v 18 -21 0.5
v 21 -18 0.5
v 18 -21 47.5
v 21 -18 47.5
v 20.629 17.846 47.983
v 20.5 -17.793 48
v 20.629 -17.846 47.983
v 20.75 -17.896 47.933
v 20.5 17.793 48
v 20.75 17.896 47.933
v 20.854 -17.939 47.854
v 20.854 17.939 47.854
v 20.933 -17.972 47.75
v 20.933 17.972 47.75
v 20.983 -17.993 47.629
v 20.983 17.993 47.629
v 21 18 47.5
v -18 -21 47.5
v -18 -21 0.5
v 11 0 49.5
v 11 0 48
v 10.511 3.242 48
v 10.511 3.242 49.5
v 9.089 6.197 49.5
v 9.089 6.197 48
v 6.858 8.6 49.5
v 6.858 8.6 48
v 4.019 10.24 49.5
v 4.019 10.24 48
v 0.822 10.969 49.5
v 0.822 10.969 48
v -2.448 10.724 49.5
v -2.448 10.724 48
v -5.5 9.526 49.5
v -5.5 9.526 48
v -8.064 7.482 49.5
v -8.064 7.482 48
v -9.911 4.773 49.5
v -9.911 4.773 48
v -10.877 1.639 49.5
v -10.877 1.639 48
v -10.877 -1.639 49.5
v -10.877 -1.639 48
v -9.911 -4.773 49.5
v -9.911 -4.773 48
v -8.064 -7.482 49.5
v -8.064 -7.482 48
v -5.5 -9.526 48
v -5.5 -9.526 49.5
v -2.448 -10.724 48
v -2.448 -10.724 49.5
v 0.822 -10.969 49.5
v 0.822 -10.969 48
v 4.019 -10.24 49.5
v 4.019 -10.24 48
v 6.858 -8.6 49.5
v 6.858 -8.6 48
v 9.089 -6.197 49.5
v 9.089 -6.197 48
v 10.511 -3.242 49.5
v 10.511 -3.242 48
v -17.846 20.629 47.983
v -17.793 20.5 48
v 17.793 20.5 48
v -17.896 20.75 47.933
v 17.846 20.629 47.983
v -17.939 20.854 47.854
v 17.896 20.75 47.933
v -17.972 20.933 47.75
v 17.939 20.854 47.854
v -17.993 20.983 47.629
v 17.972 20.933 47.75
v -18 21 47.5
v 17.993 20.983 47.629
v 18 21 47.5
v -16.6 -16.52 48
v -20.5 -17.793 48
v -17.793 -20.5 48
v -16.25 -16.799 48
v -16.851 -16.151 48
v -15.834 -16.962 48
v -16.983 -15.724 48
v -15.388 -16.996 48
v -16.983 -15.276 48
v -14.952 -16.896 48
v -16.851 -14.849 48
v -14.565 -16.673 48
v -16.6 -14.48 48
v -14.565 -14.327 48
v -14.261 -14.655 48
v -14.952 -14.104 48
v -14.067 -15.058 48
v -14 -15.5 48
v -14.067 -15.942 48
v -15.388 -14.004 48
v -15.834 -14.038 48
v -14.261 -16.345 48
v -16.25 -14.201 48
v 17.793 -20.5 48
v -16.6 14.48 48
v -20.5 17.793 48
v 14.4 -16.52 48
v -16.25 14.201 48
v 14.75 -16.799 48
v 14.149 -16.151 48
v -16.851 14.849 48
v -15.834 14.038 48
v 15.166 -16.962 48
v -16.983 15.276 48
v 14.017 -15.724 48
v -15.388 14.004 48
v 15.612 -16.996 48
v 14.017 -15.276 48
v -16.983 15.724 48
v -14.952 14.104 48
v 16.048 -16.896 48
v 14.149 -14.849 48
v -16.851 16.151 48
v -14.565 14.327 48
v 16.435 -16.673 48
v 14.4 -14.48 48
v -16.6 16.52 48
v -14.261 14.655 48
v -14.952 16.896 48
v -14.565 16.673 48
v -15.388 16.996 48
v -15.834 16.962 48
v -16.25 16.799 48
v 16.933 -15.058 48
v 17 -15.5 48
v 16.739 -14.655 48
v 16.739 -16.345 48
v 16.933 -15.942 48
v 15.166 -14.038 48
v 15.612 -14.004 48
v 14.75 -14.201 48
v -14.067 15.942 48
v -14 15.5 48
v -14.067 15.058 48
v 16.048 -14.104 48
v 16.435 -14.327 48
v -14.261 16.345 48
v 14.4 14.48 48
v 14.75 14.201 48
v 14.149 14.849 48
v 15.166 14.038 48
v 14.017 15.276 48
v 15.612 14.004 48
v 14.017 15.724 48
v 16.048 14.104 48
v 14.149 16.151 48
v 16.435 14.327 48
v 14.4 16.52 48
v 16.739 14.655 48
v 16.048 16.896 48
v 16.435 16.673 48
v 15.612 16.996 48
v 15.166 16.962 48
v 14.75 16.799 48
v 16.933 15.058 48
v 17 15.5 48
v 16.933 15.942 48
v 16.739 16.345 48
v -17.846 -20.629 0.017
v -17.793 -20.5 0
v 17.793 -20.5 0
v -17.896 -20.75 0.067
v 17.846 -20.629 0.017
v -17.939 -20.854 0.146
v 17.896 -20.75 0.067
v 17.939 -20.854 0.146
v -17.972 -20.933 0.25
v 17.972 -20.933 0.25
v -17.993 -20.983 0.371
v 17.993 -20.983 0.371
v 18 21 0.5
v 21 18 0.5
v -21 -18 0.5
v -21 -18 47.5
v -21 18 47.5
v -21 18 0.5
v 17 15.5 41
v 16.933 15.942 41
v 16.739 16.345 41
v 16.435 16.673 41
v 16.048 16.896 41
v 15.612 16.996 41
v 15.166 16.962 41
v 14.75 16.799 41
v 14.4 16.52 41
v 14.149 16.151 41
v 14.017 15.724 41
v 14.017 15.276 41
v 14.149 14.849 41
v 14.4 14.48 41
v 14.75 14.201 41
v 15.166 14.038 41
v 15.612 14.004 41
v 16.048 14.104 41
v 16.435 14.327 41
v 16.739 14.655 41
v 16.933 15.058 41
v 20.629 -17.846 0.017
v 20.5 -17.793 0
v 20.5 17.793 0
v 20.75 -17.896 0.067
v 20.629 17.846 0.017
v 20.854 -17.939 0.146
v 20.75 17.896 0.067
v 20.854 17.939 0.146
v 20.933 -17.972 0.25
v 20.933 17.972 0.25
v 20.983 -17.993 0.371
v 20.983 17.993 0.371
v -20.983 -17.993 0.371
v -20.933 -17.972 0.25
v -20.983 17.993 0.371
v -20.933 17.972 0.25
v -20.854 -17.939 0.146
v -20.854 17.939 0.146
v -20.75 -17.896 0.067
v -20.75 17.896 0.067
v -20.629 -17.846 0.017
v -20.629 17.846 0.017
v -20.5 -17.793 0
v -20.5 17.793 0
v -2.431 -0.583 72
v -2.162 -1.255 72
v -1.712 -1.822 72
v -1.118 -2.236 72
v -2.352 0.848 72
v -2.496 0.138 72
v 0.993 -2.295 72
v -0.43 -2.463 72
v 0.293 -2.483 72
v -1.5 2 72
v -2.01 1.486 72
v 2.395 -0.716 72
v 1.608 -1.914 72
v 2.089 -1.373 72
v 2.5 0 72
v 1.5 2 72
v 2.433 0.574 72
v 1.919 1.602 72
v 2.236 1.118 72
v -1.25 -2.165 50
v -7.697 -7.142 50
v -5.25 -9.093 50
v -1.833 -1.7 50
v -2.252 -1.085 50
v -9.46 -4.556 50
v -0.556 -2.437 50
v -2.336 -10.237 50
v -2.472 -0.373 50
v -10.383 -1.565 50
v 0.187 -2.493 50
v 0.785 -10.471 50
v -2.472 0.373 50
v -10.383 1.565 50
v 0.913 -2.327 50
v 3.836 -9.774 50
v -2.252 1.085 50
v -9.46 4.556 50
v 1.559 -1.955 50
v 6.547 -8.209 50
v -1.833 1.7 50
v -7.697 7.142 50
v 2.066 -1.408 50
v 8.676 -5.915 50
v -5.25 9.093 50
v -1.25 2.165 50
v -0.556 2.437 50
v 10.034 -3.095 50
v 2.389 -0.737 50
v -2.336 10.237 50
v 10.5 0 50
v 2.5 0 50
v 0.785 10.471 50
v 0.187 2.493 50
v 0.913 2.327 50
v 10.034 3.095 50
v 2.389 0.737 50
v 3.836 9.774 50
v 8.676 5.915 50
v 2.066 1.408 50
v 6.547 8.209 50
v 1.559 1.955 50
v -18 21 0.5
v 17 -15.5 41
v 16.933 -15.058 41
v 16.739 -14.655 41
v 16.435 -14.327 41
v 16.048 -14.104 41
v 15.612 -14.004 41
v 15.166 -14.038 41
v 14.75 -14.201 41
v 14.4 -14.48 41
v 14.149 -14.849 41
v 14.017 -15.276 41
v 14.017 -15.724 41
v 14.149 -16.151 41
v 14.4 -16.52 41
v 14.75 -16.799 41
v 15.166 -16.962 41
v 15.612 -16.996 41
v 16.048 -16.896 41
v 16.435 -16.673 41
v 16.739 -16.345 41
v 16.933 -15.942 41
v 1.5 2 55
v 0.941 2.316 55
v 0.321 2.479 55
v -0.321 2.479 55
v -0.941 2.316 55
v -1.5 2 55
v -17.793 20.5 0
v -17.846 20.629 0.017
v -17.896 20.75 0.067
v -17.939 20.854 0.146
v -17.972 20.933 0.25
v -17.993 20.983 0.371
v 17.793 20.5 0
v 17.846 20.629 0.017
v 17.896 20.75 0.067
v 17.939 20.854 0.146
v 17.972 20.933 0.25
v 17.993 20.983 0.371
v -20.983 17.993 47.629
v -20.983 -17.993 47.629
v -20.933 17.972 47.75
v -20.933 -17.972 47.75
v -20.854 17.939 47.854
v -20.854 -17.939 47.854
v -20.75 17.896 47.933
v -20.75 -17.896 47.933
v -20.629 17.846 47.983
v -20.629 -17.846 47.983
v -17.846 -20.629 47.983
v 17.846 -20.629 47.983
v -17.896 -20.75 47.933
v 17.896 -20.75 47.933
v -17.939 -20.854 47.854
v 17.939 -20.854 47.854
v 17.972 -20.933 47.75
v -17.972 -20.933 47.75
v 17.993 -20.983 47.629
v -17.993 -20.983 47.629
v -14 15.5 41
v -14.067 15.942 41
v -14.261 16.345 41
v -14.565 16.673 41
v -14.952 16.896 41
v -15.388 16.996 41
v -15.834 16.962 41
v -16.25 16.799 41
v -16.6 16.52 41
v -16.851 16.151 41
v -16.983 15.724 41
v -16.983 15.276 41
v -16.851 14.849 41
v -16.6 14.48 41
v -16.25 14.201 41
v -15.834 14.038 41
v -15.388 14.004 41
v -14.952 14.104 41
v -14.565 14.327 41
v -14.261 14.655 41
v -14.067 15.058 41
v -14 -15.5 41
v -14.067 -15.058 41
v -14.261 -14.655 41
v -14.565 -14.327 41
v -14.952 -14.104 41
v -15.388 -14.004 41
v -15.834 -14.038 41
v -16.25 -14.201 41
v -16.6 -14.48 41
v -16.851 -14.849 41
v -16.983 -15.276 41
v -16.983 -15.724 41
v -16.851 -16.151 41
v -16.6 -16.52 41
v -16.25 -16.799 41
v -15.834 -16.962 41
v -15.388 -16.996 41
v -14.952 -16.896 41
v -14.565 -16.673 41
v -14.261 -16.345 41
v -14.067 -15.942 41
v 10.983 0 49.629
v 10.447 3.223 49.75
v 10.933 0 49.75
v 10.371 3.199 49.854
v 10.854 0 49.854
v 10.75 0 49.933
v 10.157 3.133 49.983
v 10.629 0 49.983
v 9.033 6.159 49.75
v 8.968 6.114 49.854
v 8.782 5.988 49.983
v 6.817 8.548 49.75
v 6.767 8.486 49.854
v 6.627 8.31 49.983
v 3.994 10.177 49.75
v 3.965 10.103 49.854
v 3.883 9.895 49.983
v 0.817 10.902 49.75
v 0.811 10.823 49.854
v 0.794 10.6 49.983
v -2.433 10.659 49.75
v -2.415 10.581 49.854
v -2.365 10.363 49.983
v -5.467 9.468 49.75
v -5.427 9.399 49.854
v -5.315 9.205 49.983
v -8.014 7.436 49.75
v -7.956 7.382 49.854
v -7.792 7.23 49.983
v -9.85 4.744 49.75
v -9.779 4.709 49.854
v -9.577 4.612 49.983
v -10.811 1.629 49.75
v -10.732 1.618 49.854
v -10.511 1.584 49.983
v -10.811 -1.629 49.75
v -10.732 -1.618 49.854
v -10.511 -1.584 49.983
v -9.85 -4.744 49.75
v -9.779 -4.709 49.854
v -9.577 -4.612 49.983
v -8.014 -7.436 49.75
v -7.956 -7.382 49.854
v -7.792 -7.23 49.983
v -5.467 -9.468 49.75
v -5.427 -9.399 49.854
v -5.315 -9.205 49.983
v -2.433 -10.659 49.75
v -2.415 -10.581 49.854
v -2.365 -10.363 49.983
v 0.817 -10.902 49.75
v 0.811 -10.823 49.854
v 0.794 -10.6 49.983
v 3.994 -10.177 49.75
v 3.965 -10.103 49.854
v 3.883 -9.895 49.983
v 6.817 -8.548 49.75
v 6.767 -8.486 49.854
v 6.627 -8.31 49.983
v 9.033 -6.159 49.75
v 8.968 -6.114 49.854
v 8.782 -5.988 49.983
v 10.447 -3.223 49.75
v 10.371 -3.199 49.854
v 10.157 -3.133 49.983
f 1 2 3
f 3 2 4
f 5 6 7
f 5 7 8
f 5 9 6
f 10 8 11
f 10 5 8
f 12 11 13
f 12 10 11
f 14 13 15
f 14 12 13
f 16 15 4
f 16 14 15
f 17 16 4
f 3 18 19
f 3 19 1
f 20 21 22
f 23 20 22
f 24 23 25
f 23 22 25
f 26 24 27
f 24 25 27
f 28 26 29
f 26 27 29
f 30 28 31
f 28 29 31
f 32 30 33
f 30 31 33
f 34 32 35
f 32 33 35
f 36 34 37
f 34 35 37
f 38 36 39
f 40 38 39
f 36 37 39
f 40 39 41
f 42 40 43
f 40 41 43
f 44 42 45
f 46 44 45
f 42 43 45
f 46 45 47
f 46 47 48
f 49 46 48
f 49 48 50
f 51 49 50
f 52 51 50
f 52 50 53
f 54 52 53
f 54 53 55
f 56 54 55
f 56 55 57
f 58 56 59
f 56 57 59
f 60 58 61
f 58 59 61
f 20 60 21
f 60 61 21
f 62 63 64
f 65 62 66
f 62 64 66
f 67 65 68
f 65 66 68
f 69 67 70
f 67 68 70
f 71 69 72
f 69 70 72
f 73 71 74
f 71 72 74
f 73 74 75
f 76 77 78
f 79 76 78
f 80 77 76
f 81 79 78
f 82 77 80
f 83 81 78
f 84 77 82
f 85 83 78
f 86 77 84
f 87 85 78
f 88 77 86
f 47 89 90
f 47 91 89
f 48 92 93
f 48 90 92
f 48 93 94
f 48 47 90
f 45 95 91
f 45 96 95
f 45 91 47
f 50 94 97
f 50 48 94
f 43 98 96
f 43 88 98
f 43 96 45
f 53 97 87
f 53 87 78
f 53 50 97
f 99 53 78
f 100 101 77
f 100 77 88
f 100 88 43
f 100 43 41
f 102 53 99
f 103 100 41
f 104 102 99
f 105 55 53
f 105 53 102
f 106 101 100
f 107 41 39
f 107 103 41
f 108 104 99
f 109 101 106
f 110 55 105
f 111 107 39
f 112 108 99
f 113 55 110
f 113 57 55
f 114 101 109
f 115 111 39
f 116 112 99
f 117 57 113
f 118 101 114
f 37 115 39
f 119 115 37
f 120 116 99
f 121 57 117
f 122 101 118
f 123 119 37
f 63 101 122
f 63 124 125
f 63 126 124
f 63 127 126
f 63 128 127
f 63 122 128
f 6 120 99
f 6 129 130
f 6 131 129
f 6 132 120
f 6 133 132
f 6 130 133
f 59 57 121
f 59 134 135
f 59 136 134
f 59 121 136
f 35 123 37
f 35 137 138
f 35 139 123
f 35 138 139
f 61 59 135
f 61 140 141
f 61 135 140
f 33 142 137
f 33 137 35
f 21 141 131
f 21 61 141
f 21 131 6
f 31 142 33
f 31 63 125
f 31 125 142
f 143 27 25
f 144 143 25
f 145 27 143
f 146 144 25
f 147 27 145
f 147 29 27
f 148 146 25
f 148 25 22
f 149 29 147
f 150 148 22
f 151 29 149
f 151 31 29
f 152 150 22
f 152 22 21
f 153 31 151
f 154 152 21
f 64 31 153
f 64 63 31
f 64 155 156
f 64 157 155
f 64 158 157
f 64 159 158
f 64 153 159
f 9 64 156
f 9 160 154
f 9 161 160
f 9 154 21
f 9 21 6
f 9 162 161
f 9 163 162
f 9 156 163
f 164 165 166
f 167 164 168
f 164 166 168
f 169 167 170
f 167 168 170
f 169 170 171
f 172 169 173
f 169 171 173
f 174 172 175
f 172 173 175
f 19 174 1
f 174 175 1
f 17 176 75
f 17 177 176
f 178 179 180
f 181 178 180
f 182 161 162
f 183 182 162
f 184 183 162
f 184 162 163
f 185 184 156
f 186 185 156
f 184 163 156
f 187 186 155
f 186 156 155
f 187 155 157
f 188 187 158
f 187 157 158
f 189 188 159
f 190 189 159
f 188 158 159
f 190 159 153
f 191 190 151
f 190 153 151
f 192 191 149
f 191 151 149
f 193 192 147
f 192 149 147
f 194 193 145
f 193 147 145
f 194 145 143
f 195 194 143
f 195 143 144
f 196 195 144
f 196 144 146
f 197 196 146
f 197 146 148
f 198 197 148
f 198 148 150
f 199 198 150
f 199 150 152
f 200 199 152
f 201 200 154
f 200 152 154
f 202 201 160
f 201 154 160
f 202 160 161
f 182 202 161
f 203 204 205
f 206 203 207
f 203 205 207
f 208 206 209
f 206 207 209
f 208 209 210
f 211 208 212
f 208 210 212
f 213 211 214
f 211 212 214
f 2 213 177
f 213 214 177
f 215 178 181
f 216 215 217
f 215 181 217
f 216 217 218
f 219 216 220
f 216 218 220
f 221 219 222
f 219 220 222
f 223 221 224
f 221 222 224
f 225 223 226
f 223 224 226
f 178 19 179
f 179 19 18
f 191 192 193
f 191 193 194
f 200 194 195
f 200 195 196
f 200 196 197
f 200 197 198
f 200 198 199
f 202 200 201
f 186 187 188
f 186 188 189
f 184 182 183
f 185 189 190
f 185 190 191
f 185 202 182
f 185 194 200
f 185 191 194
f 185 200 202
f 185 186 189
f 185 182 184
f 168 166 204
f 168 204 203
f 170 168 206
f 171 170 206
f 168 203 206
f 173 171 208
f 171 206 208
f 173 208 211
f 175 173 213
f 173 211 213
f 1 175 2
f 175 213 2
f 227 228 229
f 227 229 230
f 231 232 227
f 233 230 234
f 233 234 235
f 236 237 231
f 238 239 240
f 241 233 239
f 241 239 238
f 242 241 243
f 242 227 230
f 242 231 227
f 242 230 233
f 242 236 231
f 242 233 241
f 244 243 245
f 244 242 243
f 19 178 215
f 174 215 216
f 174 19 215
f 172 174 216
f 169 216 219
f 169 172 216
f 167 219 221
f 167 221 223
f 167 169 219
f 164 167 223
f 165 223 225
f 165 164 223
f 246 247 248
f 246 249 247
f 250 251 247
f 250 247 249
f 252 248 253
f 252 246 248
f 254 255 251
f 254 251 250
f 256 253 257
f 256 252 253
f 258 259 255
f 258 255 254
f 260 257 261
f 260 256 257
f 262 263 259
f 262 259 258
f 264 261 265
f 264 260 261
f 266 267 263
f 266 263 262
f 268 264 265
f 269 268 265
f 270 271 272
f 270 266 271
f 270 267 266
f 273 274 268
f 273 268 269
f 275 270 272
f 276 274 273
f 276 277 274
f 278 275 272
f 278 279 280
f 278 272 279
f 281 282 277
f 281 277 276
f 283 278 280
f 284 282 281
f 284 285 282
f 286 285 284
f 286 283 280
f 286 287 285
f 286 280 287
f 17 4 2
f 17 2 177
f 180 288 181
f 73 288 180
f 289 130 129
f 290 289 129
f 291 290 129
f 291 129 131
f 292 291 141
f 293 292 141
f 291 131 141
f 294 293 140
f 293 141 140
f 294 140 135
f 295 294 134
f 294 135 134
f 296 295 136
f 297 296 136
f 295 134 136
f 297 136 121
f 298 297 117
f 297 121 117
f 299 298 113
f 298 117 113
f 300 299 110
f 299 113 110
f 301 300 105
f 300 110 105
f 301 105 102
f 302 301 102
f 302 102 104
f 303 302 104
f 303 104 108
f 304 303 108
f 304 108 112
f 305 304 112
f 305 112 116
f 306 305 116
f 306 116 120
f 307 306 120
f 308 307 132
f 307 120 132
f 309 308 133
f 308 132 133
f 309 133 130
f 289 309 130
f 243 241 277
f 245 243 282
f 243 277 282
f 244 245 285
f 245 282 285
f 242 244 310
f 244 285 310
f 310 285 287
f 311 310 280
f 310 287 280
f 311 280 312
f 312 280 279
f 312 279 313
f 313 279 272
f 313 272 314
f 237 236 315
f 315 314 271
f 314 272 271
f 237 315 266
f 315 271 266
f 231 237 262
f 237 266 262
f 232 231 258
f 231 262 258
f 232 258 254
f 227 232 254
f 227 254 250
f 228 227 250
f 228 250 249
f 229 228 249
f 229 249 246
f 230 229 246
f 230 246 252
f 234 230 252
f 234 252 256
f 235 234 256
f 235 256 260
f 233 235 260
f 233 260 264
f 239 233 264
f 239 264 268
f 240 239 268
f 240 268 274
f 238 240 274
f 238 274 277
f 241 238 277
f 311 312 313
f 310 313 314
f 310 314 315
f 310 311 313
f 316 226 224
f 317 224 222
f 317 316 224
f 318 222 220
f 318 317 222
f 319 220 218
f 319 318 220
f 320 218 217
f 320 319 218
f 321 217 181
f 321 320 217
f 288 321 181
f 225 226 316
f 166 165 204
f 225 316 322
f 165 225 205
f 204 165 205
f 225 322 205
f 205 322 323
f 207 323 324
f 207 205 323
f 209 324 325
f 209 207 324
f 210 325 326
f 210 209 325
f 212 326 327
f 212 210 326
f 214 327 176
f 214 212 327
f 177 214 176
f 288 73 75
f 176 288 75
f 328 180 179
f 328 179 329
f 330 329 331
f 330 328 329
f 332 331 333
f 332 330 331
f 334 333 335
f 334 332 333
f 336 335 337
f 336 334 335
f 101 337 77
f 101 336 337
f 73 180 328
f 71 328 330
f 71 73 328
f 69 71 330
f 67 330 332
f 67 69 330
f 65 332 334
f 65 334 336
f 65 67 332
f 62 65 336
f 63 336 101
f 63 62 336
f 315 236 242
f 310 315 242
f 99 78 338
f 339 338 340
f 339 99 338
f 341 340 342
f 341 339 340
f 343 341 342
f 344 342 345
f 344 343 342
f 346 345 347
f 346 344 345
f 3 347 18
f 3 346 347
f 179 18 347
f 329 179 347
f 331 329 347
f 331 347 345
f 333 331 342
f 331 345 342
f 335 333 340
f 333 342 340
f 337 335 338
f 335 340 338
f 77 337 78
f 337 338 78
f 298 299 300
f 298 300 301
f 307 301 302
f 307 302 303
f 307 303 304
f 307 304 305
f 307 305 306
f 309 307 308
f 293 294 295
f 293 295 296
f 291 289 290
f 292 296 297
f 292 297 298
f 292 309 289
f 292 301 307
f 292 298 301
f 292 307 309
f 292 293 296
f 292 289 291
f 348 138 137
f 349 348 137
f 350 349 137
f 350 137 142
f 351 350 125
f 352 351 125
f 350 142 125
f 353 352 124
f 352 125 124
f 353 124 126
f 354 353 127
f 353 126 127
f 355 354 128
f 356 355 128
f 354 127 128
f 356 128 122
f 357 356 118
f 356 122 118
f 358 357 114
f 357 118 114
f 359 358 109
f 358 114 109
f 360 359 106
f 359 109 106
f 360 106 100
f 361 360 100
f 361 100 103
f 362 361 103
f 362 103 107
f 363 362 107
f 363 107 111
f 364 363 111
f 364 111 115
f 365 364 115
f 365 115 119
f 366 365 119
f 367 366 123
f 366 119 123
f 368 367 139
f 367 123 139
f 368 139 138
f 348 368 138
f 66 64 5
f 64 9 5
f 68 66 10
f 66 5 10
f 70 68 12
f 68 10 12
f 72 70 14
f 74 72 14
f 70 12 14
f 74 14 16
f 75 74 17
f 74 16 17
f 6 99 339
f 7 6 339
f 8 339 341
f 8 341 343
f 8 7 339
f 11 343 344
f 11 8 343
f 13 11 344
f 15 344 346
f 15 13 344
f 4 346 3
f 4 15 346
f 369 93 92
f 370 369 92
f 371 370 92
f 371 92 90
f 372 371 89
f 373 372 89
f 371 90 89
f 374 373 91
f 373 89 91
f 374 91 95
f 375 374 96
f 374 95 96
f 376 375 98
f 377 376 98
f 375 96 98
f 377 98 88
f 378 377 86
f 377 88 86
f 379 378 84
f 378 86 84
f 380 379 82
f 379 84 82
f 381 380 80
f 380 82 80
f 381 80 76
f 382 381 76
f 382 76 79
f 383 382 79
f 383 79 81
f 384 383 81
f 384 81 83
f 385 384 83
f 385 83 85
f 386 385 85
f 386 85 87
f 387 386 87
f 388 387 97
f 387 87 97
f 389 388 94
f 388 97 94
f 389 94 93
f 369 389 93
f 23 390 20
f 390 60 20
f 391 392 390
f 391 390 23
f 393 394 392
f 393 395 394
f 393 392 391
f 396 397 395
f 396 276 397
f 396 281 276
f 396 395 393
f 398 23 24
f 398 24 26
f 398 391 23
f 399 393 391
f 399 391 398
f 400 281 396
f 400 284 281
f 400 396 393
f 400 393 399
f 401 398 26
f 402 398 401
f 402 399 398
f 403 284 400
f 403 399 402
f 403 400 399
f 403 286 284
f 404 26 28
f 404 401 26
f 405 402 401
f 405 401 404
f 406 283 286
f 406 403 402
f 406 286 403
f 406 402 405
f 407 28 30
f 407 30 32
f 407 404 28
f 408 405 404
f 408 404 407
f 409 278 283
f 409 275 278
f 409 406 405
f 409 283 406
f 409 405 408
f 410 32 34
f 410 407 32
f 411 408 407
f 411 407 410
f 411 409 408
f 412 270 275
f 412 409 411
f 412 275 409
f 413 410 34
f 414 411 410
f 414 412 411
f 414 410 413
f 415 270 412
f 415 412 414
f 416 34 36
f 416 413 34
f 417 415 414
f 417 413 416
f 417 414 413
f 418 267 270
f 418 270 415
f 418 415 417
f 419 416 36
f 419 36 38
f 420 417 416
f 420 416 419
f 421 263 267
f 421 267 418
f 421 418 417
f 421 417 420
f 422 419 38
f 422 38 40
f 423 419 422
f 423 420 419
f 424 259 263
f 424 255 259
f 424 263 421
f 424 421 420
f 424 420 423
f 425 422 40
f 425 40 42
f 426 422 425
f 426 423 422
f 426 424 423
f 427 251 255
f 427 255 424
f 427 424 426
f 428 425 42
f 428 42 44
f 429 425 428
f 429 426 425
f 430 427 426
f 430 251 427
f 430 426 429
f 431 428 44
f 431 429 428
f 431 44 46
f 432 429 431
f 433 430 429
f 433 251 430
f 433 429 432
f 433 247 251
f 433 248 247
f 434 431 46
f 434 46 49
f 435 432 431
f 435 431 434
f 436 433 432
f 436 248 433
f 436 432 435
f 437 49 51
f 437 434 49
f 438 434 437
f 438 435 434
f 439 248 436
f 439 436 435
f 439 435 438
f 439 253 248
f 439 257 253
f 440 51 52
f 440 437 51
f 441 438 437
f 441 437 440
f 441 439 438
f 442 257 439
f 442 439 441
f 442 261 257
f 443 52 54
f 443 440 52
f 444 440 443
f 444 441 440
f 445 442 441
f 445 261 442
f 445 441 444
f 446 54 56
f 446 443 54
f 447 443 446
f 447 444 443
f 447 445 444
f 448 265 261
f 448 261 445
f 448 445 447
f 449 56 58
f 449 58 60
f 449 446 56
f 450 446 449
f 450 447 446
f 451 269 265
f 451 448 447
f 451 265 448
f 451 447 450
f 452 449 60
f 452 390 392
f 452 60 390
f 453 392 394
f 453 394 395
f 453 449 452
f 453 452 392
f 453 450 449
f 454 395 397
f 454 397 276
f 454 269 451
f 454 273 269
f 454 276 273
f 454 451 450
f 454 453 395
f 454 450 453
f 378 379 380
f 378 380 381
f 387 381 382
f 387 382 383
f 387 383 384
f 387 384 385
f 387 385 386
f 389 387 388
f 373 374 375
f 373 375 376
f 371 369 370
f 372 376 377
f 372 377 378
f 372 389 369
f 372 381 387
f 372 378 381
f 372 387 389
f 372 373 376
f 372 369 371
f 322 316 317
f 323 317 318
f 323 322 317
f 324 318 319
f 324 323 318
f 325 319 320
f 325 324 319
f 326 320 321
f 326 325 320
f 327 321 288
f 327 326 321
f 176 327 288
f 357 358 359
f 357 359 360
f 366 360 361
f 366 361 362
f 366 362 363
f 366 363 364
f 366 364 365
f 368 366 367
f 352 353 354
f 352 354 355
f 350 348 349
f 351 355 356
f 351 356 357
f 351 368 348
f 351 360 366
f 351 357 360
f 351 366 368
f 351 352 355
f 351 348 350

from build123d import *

# Parameters (mm, degrees)
F2_W      = 42
F2_H      = 42
F3_DEPTH  = 48
F4_R      = 1.5
F5_DEPTH  = 7
F4_R_2    = 11
F6_DEPTH  = 2
F7_R      = 2.5
F8_DEPTH  = 22
F10_DEPTH = 17
F11_SIZE  = 3
F12_R     = 0.5
F13_R     = 0.5
F14_R     = 0.5


with BuildPart() as f3:
    # F2 (on Top) → F3 (new body)
    with BuildSketch(Plane.XY):
        Rectangle(F2_W, F2_H)
    extrude(amount=F3_DEPTH)

    # F4 (on face) → F5 (cut)
    with BuildSketch(Plane.XY.offset(48)):
        with Locations((-15.5, -15.5)):
            Circle(F4_R)
        with Locations((-15.5, 15.5)):
            Circle(F4_R)
        with Locations((15.5, 15.5)):
            Circle(F4_R)
        with Locations((15.5, -15.5)):
            Circle(F4_R)
    extrude(amount=-F5_DEPTH, mode=Mode.SUBTRACT)

    # F4 (on face) → F6 (join)
    with BuildSketch(Plane.XY.offset(48)):
        Circle(F4_R_2)
    extrude(amount=F6_DEPTH)

    # F7 (on face) → F8 (join)
    with BuildSketch(Plane.XY.offset(50)):
        Circle(F7_R)
    extrude(amount=F8_DEPTH)

    # F9 (on face) → F10 (cut)
    with BuildSketch(Plane.XY.offset(72)):
        with BuildLine():
            ThreePointArc((1.5, 2), (0, 2.5), (-1.5, 2))
            Line((-1.5, 2), (1.5, 2))
        make_face()
    extrude(amount=-F10_DEPTH, mode=Mode.SUBTRACT)

    # F11
    f11_edges = [f3.edges().sort_by_distance(p)[0] for p in [
        (21, -21, 24),
        (21, 21, 24),
        (-21, -21, 24),
        (-21, 21, 24),
    ]]
    chamfer(f11_edges, length=F11_SIZE)

    # F12
    f12_edges = [f3.edges().sort_by_distance(p)[0] for p in [
        (0, 21, 48),
        (19.5, 19.5, 48),
        (21, 0, 48),
        (19.5, -19.5, 48),
        (0, -21, 48),
        (-19.5, -19.5, 48),
        (-21, 0, 48),
        (-19.5, 19.5, 48),
    ]]
    fillet(f12_edges, radius=F12_R)

    # F13
    f13_edges = [f3.edges().sort_by_distance(p)[0] for p in [
        (-19.5, 19.5, 0),
        (0, 21, 0),
        (19.5, 19.5, 0),
        (21, 0, 0),
        (19.5, -19.5, 0),
        (0, -21, 0),
        (-19.5, -19.5, 0),
        (-21, 0, 0),
    ]]
    fillet(f13_edges, radius=F13_R)

    # F14
    f14_edges = [f3.edges().sort_by_distance(p)[0] for p in [
        (-11, 0, 50),
    ]]
    fillet(f14_edges, radius=F14_R)


solid = f3.part
